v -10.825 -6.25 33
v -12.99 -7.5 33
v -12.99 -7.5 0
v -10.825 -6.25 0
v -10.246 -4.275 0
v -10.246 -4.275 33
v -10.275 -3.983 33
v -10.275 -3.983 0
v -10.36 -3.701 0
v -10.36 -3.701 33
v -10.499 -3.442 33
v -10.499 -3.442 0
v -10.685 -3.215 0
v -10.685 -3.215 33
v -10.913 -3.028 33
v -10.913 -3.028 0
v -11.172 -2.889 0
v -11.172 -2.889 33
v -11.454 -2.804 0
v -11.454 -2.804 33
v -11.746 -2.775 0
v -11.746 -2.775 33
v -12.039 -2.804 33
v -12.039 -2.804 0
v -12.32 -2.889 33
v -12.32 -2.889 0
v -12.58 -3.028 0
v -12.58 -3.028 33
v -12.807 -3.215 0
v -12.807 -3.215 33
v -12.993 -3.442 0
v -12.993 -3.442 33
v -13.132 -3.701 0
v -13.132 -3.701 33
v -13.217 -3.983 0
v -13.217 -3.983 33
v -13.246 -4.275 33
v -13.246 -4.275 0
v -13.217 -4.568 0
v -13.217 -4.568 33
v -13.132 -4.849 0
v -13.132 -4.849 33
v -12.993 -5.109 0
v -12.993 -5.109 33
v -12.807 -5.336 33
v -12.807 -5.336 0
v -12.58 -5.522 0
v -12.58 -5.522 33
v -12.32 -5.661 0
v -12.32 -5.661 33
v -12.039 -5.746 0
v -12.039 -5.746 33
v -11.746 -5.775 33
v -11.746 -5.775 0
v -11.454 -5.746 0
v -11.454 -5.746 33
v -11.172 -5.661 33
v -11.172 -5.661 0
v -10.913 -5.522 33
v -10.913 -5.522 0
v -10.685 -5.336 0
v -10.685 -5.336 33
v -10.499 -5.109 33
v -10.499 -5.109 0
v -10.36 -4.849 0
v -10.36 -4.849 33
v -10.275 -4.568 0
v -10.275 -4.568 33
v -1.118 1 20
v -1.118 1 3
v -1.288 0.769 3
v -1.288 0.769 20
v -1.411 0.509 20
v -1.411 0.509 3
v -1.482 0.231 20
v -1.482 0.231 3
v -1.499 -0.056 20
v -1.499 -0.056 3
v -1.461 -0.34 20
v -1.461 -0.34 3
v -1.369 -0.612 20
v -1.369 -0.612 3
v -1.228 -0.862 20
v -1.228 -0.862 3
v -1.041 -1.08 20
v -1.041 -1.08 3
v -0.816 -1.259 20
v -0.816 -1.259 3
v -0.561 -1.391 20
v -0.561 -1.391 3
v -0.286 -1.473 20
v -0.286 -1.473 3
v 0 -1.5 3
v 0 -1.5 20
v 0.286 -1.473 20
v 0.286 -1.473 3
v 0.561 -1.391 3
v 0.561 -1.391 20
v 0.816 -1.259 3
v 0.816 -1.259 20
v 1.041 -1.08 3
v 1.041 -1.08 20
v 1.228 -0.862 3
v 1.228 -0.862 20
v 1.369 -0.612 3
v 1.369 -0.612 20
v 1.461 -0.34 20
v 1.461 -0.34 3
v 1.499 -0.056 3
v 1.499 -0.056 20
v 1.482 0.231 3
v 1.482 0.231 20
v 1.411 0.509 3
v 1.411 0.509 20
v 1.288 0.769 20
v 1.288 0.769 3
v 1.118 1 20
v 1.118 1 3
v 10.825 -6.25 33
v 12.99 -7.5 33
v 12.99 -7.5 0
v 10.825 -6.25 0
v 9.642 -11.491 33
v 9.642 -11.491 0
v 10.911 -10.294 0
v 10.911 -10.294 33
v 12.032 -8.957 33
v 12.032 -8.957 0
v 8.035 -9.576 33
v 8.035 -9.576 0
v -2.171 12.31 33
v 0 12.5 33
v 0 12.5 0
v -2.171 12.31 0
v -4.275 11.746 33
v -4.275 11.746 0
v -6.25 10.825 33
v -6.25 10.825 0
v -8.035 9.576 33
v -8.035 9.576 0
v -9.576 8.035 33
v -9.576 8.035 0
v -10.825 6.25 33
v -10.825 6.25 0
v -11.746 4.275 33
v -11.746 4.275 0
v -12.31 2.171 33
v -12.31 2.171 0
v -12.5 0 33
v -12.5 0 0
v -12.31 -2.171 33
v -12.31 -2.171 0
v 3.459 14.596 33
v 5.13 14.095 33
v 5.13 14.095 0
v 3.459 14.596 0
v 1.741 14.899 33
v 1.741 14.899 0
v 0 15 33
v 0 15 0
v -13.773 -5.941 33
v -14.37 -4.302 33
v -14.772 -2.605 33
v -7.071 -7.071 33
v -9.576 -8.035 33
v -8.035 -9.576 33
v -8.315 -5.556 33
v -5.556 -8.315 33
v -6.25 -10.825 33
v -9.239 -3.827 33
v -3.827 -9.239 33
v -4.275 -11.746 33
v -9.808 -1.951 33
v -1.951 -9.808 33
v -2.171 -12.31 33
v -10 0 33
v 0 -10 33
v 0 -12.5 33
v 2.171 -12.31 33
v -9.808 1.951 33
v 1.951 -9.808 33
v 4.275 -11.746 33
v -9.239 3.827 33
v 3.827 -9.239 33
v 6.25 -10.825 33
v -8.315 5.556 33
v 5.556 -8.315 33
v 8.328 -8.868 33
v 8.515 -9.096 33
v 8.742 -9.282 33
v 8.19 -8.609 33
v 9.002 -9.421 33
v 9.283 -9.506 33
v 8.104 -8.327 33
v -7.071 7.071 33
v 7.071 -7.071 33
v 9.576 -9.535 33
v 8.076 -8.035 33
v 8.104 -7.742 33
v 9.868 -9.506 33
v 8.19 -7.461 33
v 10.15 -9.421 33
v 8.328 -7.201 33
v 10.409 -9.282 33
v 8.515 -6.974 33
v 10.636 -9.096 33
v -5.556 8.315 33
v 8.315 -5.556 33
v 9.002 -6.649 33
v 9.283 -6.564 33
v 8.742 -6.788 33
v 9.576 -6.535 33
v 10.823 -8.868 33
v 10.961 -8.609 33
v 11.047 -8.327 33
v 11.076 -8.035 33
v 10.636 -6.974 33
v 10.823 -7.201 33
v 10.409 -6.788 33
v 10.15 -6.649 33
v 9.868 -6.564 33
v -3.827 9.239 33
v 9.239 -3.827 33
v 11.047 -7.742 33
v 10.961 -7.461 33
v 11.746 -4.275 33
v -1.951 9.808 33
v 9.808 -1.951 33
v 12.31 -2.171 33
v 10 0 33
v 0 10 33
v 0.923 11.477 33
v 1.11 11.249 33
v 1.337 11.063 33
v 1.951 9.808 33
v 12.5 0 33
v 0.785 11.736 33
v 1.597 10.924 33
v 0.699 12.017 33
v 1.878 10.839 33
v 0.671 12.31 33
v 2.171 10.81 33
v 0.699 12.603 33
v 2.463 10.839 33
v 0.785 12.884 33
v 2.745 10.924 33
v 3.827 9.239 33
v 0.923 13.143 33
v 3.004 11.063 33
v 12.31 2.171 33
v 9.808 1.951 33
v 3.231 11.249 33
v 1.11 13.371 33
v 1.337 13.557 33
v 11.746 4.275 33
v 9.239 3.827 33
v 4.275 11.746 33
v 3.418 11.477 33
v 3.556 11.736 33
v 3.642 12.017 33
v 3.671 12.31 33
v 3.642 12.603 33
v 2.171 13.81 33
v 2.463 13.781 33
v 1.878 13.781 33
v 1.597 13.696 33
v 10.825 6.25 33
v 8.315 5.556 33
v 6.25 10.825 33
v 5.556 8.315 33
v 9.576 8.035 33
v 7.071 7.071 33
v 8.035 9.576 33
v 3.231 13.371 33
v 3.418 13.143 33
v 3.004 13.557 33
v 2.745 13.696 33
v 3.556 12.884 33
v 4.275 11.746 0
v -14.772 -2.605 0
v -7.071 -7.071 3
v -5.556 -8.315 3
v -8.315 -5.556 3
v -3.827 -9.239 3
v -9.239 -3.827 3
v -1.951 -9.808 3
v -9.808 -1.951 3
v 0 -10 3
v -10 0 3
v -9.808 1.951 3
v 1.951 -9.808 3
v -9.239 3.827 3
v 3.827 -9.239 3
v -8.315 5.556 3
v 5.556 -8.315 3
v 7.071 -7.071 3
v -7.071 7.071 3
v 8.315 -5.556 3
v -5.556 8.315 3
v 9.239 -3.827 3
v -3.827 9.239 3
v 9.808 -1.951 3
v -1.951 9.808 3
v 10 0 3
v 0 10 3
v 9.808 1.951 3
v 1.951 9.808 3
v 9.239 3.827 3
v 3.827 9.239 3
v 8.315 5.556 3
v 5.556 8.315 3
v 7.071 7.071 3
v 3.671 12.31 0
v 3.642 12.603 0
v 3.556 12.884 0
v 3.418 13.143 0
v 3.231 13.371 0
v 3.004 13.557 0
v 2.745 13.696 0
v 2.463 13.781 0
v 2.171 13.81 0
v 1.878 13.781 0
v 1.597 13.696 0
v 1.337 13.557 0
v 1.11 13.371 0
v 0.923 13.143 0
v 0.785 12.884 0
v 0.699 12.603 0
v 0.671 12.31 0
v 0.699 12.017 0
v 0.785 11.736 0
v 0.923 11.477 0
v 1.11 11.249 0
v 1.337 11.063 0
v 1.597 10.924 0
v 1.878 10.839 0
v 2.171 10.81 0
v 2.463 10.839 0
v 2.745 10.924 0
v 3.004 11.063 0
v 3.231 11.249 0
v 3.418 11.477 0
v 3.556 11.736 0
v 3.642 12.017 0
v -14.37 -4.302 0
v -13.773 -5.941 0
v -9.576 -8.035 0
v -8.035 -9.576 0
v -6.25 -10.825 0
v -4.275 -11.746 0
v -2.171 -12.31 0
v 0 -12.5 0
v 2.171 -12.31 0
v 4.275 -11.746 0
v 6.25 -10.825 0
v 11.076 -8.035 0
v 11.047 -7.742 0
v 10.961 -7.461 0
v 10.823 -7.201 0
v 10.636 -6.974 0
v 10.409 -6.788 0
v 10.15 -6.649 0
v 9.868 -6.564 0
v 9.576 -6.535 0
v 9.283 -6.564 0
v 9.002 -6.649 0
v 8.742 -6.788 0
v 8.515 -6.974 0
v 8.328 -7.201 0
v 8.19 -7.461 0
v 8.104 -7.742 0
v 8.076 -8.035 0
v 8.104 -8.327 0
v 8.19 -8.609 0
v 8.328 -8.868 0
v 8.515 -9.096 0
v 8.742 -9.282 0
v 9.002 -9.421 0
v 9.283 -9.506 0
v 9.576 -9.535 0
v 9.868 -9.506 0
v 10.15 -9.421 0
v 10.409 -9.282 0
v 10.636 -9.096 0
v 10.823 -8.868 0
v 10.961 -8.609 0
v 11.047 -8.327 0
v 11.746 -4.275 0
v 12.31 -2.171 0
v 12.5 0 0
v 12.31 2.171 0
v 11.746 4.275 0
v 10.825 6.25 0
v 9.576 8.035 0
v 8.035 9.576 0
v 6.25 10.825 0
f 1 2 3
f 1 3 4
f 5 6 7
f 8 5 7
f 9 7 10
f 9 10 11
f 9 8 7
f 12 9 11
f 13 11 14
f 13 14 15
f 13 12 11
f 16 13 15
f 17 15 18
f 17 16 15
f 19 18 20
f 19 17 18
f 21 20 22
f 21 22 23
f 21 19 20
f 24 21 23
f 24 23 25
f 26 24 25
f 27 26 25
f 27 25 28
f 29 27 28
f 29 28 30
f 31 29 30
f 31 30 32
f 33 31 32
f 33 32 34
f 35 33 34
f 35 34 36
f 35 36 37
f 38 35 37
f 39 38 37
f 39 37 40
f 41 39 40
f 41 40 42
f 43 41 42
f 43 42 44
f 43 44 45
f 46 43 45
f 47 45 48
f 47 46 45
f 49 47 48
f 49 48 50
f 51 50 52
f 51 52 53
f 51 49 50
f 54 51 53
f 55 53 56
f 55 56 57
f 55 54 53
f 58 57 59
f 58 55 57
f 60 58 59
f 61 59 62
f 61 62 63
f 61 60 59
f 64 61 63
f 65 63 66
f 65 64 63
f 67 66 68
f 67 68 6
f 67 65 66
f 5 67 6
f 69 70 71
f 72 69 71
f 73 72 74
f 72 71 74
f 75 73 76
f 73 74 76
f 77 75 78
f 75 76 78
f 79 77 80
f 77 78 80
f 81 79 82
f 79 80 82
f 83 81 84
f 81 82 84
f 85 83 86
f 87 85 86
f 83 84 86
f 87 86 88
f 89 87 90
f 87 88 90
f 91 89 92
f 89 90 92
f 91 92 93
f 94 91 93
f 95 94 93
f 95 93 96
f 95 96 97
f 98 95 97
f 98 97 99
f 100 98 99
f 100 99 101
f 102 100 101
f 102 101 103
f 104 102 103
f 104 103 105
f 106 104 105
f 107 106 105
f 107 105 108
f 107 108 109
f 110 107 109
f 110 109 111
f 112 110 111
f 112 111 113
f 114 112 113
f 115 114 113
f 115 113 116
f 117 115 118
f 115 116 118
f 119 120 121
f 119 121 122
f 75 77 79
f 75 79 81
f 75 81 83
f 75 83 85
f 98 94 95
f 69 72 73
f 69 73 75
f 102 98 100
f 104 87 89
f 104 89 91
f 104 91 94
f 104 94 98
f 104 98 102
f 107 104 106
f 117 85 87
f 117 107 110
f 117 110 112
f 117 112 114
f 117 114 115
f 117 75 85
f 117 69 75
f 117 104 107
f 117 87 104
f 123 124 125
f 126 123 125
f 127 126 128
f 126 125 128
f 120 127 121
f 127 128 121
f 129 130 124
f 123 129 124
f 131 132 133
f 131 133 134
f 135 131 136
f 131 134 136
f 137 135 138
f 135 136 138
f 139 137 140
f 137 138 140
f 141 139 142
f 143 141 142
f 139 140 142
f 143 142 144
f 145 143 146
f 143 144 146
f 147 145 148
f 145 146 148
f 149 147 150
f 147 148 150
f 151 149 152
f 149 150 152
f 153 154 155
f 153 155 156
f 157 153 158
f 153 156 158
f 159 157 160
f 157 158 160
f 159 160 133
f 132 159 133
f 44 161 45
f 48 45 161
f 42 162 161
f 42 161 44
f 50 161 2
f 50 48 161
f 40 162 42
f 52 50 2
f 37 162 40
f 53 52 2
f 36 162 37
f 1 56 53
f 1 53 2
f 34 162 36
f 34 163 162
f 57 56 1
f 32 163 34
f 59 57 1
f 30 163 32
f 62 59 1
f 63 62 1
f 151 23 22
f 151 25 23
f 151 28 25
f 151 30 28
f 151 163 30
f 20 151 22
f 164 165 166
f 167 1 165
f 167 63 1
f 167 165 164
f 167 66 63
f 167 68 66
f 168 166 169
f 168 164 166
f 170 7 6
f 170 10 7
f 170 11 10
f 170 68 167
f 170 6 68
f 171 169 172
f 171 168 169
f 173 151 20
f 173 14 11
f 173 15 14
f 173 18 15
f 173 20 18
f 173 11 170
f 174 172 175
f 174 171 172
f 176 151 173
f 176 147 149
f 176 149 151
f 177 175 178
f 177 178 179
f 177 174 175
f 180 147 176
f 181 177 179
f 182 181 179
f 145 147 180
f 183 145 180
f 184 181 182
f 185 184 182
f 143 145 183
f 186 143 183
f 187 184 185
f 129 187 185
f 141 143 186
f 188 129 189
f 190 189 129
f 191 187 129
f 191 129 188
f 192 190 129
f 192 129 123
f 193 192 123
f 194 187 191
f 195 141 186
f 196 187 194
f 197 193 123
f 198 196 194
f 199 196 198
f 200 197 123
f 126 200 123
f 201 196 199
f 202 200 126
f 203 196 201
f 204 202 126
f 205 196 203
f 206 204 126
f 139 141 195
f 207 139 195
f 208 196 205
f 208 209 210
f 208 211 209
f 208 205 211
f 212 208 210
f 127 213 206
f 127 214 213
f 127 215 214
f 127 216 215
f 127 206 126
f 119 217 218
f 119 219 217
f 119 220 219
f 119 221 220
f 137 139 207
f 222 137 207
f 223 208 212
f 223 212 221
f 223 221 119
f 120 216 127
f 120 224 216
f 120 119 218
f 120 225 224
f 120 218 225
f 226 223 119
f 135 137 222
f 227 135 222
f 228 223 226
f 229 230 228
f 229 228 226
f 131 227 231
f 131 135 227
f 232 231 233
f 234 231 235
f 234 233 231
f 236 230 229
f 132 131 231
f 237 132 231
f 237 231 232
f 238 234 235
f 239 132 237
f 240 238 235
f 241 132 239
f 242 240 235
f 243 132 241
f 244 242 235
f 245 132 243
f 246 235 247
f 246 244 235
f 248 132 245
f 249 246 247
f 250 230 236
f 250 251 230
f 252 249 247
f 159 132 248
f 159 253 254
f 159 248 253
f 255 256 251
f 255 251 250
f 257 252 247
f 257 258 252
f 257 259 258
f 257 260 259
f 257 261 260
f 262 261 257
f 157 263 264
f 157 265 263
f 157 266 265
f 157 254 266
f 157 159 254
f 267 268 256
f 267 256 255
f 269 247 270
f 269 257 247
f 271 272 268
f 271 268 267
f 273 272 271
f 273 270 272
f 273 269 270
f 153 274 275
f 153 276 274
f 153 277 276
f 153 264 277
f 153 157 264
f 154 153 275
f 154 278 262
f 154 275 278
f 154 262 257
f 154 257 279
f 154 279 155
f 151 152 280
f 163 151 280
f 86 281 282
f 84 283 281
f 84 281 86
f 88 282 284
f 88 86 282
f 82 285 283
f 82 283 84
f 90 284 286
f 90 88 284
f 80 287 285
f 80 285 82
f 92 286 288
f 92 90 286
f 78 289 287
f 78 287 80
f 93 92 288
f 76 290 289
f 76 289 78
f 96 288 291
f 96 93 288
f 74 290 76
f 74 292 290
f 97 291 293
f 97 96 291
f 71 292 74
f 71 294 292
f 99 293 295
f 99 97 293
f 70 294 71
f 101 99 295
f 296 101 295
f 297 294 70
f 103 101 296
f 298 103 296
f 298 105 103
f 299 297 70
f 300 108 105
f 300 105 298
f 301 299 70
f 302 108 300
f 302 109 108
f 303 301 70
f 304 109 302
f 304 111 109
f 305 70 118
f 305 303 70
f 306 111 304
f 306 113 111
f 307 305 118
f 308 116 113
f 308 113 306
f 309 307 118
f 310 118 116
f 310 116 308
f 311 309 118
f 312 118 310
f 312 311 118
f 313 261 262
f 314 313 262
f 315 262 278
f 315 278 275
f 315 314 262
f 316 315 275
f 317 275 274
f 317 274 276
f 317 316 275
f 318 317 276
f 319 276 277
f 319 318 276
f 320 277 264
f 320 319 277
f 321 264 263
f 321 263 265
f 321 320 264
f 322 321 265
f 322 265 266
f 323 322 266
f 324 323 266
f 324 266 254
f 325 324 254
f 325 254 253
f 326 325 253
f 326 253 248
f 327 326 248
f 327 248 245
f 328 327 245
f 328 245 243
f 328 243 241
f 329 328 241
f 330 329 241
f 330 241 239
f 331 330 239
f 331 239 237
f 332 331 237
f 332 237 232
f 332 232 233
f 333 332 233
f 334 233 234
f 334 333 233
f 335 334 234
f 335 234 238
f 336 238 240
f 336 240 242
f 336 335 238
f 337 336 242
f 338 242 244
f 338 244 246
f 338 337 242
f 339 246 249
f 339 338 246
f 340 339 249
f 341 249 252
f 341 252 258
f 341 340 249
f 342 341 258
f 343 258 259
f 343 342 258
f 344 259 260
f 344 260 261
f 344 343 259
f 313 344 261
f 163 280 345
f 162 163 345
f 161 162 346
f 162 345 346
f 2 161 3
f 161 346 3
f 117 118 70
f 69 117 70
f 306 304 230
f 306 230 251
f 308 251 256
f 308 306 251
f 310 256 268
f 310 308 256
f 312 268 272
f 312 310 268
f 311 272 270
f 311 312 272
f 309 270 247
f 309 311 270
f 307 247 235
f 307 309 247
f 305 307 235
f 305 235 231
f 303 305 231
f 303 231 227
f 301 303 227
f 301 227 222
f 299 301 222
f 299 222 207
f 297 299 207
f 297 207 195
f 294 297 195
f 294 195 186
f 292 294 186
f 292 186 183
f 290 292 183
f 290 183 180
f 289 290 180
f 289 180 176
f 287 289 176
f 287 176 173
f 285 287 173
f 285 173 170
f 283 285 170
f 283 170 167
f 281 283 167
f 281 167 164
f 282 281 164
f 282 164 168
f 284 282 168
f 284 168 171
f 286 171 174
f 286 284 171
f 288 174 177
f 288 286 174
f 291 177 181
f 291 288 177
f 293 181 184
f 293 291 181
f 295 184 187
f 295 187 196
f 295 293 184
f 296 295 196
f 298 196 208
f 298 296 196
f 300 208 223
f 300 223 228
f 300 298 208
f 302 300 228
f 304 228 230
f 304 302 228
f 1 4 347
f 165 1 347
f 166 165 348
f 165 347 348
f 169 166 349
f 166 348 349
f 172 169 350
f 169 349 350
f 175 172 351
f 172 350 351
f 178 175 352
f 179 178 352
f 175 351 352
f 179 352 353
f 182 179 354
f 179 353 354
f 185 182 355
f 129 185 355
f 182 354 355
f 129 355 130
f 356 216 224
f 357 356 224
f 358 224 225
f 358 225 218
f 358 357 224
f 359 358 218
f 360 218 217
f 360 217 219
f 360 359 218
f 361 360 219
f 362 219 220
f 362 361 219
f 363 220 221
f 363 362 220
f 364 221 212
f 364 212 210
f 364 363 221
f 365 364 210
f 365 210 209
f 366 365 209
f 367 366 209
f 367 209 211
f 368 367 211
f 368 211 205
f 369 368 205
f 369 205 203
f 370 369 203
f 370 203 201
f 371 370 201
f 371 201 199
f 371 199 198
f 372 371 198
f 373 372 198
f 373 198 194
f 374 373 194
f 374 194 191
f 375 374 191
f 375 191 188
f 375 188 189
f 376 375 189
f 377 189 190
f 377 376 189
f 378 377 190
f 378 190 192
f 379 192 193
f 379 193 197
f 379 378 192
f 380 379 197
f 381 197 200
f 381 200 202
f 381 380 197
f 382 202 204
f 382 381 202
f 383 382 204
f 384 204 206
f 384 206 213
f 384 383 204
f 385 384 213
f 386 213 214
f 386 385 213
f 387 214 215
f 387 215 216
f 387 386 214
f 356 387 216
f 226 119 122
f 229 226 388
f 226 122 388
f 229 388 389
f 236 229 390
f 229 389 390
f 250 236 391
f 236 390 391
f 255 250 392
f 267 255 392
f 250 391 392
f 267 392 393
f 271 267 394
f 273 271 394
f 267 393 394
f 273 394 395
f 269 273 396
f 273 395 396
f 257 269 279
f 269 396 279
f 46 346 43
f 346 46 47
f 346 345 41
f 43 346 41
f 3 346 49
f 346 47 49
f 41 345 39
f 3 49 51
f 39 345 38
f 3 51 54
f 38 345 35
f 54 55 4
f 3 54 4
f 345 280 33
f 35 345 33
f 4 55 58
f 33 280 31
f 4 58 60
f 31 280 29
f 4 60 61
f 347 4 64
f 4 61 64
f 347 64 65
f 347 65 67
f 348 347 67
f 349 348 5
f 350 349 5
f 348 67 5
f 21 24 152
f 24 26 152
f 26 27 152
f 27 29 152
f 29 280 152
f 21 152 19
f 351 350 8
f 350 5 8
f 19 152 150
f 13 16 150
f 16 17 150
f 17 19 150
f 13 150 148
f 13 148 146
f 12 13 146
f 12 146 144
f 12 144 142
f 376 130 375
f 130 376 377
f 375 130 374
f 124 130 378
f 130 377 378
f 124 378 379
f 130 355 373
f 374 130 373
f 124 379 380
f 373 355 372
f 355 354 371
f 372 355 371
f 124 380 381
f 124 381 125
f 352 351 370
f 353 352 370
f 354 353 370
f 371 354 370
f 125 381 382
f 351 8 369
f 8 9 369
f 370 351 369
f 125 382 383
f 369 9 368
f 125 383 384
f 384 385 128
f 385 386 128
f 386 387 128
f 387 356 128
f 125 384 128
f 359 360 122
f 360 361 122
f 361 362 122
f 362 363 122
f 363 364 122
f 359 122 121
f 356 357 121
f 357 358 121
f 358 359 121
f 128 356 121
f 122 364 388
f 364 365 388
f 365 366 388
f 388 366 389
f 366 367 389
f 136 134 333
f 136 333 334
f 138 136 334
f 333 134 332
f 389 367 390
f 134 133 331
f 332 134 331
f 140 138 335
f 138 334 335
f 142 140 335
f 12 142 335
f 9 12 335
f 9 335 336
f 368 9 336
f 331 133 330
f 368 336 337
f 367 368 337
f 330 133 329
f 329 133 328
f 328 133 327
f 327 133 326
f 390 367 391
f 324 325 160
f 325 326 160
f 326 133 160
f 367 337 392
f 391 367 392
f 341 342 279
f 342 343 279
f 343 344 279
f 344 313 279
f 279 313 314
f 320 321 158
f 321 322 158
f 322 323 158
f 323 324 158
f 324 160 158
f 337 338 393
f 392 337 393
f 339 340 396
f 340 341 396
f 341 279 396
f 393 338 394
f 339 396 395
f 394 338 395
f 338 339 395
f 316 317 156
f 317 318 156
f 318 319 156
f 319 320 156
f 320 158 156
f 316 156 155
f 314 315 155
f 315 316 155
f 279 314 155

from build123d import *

# Parameters (mm, degrees)
F0_R     = 1.5
F0_R_2   = 10
F1_DEPTH = 3
F2_DEPTH = 33
F3_DEPTH = 20


with BuildPart() as f1:
    # F0 (on Top) → F1 (new body)
    with BuildSketch(Plane.XY):
        with BuildLine():
            Line((-12.9903810568, -7.5), (-10.8253175473, -6.25))
            ThreePointArc((-10.8253175473, -6.25), (-2.1706022208, -12.3100969127), (8.0348451211, -9.575555539))
            Line((8.0348451211, -9.575555539), (9.6418141453, -11.4906666468))
            ThreePointArc((9.6418141453, -11.4906666468), (11.4906666468, -9.6418141453), (12.9903810568, -7.5))
            Line((12.9903810568, -7.5), (10.8253175473, -6.25))
            ThreePointArc((10.8253175473, -6.25), (11.7461577598, 4.2752517916), (4.2752517916, 11.7461577598))
            Line((4.2752517916, 11.7461577598), (5.1303021499, 14.0953893118))
            ThreePointArc((5.1303021499, 14.0953893118), (2.604722665, 14.7721162952), (0, 15))
            Line((0, 15), (0, 12.5))
            ThreePointArc((0, 12.5), (-9.575555539, 8.0348451211), (-12.3100969127, -2.1706022208))
            Line((-12.3100969127, -2.1706022208), (-14.7721162952, -2.604722665))
            ThreePointArc((-14.7721162952, -2.604722665), (-14.0953893118, -5.1303021499), (-12.9903810568, -7.5))
        make_face()
        with Locations((-11.7461577598, -4.2752517916)):
            Circle(F0_R, mode=Mode.SUBTRACT)
        with Locations((9.575555539, -8.0348451211)):
            Circle(F0_R, mode=Mode.SUBTRACT)
        Circle(F0_R_2, mode=Mode.SUBTRACT)
        with Locations((2.1706022208, 12.3100969127)):
            Circle(F0_R, mode=Mode.SUBTRACT)
        Circle(F0_R_2)
        with BuildLine():
            ThreePointArc((1.1180339887, 1), (0, -1.5), (-1.1180339887, 1))
            Line((-1.1180339887, 1), (1.1180339887, 1))
        make_face(mode=Mode.SUBTRACT)
    extrude(amount=F1_DEPTH)

    # F0 (on Top) → F2 (join)
    with BuildSketch(Plane.XY):
        with BuildLine():
            Line((-12.9903810568, -7.5), (-10.8253175473, -6.25))
            ThreePointArc((-10.8253175473, -6.25), (-2.1706022208, -12.3100969127), (8.0348451211, -9.575555539))
            Line((8.0348451211, -9.575555539), (9.6418141453, -11.4906666468))
            ThreePointArc((9.6418141453, -11.4906666468), (11.4906666468, -9.6418141453), (12.9903810568, -7.5))
            Line((12.9903810568, -7.5), (10.8253175473, -6.25))
            ThreePointArc((10.8253175473, -6.25), (11.7461577598, 4.2752517916), (4.2752517916, 11.7461577598))
            Line((4.2752517916, 11.7461577598), (5.1303021499, 14.0953893118))
            ThreePointArc((5.1303021499, 14.0953893118), (2.604722665, 14.7721162952), (0, 15))
            Line((0, 15), (0, 12.5))
            ThreePointArc((0, 12.5), (-9.575555539, 8.0348451211), (-12.3100969127, -2.1706022208))
            Line((-12.3100969127, -2.1706022208), (-14.7721162952, -2.604722665))
            ThreePointArc((-14.7721162952, -2.604722665), (-14.0953893118, -5.1303021499), (-12.9903810568, -7.5))
        make_face()
        with Locations((-11.7461577598, -4.2752517916)):
            Circle(F0_R, mode=Mode.SUBTRACT)
        with Locations((9.575555539, -8.0348451211)):
            Circle(F0_R, mode=Mode.SUBTRACT)
        Circle(F0_R_2, mode=Mode.SUBTRACT)
        with Locations((2.1706022208, 12.3100969127)):
            Circle(F0_R, mode=Mode.SUBTRACT)
    extrude(amount=F2_DEPTH)

    # F0 (on Top) → F3 (join)
    with BuildSketch(Plane.XY):
        with BuildLine():
            Line((1.1180339887, 1), (-1.1180339887, 1))
            ThreePointArc((-1.1180339887, 1), (0, -1.5), (1.1180339887, 1))
        make_face()
    extrude(amount=F3_DEPTH)


solid = f1.part
